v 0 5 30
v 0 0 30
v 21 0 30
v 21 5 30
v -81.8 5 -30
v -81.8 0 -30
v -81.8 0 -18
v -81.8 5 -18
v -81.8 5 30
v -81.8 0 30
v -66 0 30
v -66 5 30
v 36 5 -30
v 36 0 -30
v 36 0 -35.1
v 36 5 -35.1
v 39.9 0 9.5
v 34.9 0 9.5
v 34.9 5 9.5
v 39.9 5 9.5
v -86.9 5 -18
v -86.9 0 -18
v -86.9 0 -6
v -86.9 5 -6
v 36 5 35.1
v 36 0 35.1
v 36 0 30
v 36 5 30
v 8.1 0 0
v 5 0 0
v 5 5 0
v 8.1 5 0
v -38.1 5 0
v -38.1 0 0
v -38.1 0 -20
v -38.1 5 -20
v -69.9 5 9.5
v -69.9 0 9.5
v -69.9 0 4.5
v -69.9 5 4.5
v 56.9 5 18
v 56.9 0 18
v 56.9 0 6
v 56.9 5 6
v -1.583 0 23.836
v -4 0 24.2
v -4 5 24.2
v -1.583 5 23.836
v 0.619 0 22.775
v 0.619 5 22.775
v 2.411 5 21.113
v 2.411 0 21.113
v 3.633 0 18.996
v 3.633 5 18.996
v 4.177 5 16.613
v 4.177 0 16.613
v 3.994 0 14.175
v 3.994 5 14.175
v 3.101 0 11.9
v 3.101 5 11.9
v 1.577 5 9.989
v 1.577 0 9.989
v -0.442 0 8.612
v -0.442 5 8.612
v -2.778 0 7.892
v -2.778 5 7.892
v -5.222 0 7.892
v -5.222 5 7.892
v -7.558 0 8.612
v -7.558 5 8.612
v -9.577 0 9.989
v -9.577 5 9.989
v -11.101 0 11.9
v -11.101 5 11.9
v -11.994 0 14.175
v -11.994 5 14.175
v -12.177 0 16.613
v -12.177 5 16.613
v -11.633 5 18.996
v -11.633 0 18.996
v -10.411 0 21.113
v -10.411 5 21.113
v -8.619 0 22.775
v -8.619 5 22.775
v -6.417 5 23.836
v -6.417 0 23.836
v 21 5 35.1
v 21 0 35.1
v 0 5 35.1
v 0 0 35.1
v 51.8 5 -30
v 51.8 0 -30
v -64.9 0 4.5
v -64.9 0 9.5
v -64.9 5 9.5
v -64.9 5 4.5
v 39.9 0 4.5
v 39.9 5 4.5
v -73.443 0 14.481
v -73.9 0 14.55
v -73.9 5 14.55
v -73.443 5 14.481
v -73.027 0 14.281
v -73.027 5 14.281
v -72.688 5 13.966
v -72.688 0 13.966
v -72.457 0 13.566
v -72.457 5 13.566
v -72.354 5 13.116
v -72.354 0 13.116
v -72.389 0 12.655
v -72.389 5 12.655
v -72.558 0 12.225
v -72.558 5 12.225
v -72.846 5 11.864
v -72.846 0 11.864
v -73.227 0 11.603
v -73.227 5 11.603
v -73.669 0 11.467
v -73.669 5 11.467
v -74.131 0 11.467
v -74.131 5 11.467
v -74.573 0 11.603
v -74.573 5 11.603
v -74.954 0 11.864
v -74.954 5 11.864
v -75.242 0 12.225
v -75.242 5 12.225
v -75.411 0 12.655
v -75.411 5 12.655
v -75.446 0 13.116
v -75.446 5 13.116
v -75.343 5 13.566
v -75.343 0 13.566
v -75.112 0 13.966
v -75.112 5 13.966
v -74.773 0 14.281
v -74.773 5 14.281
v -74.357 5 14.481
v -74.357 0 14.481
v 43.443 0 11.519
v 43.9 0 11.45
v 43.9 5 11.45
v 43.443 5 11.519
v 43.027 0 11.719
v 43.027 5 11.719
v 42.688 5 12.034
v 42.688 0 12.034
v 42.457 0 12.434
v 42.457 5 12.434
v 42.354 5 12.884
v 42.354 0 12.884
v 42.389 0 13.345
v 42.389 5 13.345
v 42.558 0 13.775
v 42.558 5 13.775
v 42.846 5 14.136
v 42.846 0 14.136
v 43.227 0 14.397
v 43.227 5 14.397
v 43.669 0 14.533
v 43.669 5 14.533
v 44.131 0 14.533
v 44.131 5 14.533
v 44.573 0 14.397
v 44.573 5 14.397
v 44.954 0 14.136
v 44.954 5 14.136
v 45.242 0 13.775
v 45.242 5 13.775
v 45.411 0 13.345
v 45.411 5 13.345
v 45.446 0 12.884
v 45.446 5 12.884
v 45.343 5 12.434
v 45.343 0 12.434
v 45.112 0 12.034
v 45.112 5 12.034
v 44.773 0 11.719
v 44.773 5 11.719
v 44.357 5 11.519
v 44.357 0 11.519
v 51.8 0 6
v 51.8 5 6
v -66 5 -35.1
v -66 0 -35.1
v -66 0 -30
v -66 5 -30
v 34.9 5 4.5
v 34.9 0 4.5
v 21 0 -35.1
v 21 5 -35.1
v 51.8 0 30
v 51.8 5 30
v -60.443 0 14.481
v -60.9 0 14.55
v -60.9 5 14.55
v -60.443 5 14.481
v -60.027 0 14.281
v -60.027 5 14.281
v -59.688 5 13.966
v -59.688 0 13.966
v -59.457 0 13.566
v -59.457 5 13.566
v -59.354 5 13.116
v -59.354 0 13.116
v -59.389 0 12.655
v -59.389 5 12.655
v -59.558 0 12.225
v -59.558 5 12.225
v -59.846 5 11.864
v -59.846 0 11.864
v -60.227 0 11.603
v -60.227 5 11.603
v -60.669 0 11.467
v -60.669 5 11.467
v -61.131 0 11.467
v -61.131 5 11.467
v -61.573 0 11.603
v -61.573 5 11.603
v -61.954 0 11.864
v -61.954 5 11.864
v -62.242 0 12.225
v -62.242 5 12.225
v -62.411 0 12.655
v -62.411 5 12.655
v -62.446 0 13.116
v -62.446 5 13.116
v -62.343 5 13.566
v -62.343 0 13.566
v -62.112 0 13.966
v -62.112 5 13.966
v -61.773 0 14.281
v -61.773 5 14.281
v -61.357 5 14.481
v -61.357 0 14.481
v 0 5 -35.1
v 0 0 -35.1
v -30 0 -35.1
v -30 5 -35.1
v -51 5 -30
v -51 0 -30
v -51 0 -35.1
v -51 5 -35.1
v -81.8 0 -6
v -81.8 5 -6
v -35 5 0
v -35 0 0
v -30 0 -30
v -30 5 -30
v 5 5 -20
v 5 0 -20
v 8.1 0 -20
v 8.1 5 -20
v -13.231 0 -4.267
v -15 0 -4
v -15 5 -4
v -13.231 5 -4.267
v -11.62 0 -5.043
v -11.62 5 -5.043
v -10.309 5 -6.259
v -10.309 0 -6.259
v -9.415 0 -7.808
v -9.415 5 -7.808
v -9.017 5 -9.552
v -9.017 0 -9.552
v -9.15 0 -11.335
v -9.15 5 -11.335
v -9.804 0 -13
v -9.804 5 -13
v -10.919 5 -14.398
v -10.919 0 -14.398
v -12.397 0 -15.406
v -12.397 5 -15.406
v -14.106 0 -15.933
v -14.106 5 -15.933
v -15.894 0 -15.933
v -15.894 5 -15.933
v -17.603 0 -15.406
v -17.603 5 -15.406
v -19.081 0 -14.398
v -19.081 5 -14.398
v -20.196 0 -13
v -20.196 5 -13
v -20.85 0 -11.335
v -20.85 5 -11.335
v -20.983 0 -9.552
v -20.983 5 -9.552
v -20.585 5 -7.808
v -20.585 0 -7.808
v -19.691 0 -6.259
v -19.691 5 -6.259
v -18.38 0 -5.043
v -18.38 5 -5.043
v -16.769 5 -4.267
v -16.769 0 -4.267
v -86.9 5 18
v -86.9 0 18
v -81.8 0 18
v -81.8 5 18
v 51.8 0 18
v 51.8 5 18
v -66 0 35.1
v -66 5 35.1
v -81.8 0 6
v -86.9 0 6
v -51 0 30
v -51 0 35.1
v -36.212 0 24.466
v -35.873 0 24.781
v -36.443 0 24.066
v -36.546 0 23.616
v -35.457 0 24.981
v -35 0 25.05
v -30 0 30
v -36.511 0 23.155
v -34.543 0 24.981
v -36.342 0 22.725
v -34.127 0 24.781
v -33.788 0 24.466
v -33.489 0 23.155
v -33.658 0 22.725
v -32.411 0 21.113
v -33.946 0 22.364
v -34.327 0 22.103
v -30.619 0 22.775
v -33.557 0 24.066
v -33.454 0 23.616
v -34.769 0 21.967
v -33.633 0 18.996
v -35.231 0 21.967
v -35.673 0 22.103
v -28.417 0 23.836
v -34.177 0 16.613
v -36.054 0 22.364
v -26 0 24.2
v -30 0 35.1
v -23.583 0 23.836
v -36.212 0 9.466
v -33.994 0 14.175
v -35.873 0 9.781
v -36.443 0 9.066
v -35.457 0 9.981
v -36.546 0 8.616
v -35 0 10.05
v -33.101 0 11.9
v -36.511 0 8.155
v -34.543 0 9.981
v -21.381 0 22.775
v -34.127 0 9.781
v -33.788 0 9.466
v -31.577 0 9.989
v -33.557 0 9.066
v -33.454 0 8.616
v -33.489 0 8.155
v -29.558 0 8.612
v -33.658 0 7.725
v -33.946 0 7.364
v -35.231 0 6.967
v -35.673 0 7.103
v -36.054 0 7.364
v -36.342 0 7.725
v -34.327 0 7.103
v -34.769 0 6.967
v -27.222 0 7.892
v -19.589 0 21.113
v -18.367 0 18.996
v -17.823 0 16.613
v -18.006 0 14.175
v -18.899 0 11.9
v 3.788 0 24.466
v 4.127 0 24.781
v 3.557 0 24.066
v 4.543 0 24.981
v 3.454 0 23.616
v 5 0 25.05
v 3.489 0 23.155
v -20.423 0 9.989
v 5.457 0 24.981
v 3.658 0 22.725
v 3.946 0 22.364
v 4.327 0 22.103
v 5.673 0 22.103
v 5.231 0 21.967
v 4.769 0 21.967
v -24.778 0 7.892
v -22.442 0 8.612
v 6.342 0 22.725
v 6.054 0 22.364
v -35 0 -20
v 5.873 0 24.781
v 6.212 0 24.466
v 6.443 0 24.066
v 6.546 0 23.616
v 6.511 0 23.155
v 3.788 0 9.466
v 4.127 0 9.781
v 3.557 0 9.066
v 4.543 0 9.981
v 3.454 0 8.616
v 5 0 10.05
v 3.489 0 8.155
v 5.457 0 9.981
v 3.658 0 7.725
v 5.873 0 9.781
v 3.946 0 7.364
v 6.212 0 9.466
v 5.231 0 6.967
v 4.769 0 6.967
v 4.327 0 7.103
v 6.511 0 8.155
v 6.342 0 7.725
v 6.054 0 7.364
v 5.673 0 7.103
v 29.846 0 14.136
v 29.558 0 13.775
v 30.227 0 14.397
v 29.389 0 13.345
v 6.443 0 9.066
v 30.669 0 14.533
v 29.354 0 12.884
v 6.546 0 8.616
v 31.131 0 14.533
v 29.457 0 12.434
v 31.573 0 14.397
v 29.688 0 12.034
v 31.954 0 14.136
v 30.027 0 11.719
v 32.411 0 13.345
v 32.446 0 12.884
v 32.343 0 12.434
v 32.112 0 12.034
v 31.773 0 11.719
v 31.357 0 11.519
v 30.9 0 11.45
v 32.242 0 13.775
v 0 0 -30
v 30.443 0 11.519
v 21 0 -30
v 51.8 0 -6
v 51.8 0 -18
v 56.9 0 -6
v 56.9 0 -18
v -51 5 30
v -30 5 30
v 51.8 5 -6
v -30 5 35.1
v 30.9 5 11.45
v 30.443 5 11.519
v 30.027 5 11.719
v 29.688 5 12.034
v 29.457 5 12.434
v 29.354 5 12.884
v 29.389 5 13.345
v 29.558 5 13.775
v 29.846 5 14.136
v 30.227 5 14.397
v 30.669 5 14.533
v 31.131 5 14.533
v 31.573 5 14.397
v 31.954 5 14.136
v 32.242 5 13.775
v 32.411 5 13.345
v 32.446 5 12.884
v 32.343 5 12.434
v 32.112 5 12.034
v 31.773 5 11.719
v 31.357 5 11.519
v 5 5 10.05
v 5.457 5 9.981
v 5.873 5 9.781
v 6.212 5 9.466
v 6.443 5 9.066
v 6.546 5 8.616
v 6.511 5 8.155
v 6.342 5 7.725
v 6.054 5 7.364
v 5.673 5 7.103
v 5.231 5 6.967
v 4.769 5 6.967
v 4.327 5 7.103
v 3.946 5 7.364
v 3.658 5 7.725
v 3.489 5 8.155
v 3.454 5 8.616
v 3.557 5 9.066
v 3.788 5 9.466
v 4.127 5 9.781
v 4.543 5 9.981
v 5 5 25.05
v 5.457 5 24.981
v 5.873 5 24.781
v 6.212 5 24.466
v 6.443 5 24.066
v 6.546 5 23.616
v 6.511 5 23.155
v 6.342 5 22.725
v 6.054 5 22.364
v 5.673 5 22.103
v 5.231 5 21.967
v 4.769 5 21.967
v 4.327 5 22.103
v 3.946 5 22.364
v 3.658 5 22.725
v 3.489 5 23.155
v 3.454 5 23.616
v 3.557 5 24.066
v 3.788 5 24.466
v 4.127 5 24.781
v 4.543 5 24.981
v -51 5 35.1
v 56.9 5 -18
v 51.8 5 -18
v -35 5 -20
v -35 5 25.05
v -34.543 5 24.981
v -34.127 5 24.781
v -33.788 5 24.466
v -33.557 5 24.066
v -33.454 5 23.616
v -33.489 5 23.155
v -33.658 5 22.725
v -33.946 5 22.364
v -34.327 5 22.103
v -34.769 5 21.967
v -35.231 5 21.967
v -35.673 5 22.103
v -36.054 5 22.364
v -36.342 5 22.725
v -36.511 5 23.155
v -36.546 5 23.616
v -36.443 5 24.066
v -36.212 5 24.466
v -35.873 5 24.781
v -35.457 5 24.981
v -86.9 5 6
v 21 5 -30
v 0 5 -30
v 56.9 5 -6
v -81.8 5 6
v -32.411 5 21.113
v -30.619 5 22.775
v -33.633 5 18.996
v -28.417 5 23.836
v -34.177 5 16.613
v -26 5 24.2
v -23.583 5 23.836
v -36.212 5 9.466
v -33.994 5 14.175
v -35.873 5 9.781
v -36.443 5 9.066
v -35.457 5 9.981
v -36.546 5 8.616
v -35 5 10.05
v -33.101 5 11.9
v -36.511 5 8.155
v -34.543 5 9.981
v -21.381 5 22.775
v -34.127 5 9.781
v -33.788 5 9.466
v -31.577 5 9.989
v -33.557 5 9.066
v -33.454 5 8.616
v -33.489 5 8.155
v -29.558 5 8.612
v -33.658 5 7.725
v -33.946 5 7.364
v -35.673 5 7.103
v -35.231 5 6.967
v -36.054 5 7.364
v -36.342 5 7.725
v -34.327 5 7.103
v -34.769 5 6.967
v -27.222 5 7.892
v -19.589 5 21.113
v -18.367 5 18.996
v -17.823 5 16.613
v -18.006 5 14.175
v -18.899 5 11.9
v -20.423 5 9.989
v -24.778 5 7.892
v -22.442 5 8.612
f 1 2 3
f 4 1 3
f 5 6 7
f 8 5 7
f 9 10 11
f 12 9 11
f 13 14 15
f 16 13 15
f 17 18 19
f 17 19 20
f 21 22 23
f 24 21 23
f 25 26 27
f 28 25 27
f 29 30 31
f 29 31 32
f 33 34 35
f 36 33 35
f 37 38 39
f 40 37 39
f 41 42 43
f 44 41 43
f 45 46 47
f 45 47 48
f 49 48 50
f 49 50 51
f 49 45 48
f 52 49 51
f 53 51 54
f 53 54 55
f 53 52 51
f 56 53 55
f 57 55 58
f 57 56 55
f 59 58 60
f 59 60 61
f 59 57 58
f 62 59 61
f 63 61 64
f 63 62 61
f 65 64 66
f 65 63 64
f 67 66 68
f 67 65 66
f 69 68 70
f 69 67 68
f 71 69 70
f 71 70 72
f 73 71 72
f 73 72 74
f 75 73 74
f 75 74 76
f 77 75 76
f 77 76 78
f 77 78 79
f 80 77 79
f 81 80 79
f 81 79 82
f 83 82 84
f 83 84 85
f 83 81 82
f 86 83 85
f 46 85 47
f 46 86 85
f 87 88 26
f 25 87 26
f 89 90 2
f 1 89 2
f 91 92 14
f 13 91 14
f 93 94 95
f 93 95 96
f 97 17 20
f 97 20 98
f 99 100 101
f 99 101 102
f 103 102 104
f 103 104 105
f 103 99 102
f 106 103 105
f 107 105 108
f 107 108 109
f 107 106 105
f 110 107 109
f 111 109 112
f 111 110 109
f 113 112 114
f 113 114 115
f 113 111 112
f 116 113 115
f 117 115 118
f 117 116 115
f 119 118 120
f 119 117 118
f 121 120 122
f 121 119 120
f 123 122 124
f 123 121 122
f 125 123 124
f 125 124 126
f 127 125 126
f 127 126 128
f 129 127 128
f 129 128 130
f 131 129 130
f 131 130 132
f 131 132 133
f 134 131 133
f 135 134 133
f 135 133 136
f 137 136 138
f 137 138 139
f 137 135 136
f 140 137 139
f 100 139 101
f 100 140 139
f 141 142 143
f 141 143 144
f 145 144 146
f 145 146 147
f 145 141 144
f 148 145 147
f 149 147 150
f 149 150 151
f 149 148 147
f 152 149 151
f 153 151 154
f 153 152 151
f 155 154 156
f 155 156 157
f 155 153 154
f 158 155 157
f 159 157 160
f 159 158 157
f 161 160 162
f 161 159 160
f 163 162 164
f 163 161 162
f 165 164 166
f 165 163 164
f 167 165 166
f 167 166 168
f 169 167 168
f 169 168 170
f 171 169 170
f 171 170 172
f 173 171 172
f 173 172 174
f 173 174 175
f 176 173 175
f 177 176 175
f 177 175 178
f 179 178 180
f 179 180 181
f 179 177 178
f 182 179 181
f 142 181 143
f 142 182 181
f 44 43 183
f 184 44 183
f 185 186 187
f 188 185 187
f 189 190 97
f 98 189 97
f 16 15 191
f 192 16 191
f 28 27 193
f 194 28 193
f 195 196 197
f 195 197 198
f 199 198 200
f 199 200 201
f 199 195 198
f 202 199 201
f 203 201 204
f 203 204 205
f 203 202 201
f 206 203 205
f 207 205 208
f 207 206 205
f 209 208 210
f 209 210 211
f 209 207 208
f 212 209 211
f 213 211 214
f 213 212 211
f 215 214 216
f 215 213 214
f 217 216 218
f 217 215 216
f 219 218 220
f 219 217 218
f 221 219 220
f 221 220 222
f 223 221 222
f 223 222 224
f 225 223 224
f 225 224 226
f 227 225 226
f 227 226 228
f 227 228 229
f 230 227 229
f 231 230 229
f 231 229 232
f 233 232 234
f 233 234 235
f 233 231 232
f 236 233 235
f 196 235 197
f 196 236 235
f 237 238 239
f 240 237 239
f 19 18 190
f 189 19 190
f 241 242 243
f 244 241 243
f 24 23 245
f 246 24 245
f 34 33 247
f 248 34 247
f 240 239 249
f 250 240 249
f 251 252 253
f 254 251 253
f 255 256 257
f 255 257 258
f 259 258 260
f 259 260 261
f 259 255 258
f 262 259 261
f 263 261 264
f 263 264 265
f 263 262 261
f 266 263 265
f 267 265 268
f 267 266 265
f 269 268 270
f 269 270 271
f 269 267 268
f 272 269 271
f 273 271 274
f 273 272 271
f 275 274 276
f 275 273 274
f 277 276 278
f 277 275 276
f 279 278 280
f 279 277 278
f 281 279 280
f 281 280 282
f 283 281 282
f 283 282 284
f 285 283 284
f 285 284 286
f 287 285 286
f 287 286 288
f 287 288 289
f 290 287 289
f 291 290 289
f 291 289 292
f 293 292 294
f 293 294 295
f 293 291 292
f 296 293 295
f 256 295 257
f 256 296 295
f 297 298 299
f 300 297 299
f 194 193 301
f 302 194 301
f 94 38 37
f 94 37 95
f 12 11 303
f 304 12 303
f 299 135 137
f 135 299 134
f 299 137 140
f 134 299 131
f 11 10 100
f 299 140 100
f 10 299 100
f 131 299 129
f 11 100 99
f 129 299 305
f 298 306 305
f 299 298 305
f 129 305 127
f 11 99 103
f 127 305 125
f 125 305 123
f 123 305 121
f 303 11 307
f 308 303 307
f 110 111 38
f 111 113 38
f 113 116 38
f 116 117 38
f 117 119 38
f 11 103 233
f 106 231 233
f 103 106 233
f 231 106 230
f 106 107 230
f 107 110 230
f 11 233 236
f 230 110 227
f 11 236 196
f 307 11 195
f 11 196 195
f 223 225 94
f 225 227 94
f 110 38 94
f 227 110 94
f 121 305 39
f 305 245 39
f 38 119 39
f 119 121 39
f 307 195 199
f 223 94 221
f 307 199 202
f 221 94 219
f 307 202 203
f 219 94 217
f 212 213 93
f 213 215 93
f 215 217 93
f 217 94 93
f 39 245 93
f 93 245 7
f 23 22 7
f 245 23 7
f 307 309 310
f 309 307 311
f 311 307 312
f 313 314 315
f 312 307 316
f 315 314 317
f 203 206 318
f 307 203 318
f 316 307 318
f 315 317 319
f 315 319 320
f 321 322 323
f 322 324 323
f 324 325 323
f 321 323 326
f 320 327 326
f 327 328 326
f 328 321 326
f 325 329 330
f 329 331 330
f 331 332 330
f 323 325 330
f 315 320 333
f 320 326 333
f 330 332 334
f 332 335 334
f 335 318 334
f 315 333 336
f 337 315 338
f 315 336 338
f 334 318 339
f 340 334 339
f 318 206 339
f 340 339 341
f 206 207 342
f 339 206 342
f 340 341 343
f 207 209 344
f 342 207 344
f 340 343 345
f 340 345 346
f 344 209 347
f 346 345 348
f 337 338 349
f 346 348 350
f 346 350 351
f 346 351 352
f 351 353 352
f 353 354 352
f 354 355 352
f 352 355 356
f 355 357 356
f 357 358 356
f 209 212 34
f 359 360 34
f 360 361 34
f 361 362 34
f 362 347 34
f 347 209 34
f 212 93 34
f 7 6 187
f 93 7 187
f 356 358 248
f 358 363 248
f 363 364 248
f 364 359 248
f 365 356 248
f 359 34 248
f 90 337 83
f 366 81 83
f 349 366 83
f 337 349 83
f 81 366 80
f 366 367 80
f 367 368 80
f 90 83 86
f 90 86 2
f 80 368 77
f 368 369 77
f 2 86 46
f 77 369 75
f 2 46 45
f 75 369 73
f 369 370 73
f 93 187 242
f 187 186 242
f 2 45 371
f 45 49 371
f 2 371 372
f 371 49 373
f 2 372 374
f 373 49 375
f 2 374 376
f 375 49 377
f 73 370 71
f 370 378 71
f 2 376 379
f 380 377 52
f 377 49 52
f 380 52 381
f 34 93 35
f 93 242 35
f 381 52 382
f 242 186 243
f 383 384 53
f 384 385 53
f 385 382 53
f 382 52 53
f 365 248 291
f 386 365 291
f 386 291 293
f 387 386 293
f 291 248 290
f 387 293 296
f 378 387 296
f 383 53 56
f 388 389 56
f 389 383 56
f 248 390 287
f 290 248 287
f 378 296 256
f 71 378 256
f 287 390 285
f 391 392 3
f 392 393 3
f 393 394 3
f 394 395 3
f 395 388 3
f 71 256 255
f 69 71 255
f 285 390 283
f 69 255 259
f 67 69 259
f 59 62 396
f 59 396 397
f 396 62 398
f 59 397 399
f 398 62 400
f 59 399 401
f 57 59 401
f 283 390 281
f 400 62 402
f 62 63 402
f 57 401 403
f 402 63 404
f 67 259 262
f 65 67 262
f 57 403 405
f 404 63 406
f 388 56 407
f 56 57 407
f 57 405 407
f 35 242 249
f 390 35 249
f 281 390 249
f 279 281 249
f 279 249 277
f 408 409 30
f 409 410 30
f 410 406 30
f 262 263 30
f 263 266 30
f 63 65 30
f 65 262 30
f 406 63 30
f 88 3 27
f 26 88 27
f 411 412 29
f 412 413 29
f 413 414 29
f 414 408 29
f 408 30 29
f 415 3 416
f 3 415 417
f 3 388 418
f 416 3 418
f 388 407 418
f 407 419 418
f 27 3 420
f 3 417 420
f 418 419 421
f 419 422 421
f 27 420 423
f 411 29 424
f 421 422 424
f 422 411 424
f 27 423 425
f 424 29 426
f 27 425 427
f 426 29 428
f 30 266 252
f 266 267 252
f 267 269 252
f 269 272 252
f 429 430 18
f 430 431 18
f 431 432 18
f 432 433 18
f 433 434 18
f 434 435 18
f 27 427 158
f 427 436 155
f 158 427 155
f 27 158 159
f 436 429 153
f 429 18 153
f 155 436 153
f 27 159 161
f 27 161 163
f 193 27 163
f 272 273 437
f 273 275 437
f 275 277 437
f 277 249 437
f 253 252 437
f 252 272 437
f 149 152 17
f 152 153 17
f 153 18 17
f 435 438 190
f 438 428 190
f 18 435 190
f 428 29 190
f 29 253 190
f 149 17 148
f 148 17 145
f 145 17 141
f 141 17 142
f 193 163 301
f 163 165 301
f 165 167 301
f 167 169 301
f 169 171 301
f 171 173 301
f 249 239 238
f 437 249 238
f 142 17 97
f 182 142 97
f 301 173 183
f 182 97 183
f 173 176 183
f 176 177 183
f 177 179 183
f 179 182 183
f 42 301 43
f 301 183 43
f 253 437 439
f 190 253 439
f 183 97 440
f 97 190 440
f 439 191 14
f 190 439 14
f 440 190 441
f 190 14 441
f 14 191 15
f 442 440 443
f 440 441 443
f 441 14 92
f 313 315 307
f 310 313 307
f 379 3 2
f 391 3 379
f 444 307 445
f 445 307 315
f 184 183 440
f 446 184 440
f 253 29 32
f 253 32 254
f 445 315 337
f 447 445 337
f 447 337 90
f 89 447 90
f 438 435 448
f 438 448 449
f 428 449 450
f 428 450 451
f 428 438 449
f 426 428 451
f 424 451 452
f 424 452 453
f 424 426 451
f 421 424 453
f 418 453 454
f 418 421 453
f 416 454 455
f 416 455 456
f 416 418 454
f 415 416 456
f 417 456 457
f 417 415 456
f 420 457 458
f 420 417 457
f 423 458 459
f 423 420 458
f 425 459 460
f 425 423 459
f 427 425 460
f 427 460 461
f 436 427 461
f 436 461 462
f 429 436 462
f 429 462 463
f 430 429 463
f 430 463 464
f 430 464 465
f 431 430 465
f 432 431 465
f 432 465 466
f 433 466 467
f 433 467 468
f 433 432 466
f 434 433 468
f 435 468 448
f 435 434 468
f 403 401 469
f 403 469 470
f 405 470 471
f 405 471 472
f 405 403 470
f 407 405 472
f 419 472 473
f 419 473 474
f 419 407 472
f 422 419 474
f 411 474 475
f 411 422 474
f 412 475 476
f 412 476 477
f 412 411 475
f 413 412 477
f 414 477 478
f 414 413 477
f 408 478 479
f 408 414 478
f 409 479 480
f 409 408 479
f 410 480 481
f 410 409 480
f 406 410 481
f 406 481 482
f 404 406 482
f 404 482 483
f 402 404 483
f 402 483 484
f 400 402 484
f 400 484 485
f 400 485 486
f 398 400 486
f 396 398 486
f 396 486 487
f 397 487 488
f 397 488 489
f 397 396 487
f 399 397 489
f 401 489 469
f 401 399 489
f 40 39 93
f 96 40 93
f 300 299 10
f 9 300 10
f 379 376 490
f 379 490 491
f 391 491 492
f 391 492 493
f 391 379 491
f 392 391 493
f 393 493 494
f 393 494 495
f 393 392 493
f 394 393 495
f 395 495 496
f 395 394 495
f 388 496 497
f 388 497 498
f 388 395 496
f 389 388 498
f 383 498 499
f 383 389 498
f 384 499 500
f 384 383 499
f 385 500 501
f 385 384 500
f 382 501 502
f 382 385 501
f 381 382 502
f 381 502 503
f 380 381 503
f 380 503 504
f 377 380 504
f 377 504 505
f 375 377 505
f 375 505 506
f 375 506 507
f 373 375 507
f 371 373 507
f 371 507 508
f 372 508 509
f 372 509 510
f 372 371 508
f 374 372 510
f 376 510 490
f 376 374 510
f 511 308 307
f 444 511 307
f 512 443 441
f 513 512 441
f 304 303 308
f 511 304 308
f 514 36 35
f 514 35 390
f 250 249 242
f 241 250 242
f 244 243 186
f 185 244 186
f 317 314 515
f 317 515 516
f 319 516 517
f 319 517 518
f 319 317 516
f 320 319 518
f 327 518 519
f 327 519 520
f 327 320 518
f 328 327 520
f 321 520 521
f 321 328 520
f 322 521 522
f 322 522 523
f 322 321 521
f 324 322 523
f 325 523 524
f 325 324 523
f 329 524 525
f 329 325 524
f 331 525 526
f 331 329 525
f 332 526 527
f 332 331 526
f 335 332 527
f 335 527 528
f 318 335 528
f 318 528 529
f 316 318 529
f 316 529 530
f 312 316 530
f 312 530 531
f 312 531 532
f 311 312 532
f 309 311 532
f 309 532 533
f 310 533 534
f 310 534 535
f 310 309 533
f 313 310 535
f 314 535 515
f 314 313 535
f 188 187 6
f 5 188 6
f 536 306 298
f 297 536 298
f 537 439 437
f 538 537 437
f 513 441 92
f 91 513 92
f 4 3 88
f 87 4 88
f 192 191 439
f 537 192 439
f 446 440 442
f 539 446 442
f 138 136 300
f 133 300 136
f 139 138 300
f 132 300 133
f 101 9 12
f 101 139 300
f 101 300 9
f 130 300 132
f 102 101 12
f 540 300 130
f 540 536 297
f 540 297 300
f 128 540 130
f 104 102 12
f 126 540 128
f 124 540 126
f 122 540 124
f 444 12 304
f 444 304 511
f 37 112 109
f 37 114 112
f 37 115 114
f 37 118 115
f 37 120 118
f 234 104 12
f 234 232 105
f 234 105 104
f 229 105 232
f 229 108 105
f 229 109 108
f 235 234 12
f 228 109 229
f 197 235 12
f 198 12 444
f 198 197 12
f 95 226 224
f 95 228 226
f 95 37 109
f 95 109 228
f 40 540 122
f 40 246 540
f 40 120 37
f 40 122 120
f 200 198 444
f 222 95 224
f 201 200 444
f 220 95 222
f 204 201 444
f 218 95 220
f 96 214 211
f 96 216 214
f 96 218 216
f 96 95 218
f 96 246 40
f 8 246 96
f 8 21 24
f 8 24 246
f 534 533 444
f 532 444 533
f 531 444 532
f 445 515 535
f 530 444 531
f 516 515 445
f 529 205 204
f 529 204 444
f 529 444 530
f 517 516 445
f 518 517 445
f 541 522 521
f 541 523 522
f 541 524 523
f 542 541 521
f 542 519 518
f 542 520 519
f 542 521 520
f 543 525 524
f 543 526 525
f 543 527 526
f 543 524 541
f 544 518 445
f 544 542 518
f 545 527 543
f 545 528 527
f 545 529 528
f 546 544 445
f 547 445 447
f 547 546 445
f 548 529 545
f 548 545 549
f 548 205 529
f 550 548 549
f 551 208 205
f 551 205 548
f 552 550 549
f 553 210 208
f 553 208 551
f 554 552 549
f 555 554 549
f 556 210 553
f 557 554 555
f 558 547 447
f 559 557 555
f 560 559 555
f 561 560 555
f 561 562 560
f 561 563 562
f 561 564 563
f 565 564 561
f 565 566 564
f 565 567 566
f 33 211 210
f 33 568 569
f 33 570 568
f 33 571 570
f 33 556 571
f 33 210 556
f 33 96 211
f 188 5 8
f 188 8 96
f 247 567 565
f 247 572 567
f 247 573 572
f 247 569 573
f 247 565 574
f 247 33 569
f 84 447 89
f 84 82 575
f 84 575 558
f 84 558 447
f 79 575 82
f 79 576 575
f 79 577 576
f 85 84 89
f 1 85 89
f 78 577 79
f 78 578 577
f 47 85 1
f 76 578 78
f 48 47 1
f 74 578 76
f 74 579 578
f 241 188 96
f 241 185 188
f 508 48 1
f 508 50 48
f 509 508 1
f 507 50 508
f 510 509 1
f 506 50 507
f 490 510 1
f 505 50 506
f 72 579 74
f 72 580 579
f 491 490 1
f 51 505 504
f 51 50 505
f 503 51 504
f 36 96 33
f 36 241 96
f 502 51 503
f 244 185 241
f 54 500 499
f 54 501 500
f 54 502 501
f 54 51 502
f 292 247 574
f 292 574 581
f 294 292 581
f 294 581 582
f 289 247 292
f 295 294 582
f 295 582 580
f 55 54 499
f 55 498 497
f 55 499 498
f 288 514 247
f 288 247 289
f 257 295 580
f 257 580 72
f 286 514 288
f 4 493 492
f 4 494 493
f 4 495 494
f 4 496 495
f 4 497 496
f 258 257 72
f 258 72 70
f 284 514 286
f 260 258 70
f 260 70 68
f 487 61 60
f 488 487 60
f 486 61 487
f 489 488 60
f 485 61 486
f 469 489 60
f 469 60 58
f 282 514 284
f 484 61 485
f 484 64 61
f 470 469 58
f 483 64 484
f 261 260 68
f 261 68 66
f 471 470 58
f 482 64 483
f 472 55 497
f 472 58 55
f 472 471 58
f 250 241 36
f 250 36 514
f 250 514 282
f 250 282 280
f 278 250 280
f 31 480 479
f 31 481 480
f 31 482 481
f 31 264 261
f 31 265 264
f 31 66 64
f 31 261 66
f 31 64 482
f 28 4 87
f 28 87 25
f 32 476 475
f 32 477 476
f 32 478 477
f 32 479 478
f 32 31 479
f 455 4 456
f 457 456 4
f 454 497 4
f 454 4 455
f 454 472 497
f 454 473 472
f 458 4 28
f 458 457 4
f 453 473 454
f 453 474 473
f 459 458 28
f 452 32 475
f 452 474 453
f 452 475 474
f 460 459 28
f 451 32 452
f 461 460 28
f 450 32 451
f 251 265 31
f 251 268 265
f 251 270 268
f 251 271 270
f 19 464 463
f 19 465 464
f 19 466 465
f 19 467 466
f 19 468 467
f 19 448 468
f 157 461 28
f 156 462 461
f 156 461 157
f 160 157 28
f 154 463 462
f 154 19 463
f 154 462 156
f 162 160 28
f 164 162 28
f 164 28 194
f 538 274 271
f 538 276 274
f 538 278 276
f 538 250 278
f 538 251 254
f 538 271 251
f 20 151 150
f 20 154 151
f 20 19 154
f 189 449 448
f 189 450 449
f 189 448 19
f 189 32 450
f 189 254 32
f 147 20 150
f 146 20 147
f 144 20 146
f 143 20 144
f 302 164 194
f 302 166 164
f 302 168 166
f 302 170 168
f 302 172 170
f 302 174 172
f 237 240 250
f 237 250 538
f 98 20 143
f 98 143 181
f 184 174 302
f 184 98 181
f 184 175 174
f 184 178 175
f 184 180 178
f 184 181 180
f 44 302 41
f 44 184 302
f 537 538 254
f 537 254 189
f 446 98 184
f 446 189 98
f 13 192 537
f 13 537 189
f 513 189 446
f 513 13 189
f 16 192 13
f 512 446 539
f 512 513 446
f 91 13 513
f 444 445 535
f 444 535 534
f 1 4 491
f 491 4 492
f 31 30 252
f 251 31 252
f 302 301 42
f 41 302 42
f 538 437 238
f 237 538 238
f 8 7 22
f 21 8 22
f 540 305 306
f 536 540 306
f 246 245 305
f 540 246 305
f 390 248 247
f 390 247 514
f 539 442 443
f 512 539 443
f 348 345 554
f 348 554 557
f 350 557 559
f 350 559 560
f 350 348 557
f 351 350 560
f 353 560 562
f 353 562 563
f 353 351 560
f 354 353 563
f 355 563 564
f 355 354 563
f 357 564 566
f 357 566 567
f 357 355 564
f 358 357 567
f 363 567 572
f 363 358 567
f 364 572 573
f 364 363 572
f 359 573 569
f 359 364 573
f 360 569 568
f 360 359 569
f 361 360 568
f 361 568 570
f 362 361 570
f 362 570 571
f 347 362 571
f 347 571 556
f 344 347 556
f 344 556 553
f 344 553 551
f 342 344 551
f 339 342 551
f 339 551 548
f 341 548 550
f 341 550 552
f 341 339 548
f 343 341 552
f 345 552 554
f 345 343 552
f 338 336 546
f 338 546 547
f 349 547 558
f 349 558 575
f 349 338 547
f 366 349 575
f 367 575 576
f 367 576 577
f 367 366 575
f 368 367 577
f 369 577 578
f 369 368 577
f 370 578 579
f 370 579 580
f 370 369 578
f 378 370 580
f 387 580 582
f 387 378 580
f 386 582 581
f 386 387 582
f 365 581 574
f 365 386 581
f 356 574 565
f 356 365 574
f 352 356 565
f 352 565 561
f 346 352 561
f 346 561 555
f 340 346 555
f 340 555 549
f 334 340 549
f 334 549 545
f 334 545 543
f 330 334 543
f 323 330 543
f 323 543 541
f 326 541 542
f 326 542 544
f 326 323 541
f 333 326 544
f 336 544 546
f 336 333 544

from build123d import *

# Parameters (mm, degrees)
SKETCH1_R           = 8.2
SKETCH1_R_2         = 6
SKETCH1_R_3         = 1.55
SKETCH1_W           = 3.1
SKETCH1_H           = 20
SKETCH1_W_2         = 5
SKETCH1_H_2         = 5
BOSS_EXTRUDE1_DEPTH = 5


with BuildPart() as part:
    # Sketch1 → Boss-Extrude1 (new body)
    with BuildSketch(Plane(origin=(0, 0, 0), x_dir=(1, 0, 0), z_dir=(0, 1, 0))):
        Polygon((-81.8, -30), (-66, -30), (-66, -35.1), (-51, -35.1), (-51, -30), (-30, -30), (-30, -35.1), (0, -35.1), (0, -30), (21, -30), (21, -35.1), (36, -35.1), (36, -30), (51.8, -30), (51.8, -18), (56.9, -18), (56.9, -6), (51.8, -6), (51.8, 6), (56.9, 6), (56.9, 18), (51.8, 18), (51.8, 30), (36, 30), (36, 35.1), (21, 35.1), (21, 30), (0, 30), (0, 35.1), (-30, 35.1), (-30, 30), (-51, 30), (-51, 35.1), (-66, 35.1), (-66, 30), (-81.8, 30), (-81.8, 18), (-86.9, 18), (-86.9, 6), (-81.8, 6), (-81.8, -6), (-86.9, -6), (-86.9, -18), (-81.8, -18), align=None)
        with Locations(Location((-4, -16, 0), (0, 0, 270))):
            Circle(SKETCH1_R, mode=Mode.SUBTRACT)
        with Locations(Location((-26, -16, 0), (0, 0, 270))):
            Circle(SKETCH1_R, mode=Mode.SUBTRACT)
        with Locations(Location((-15, 10, 0), (0, 0, 270))):
            Circle(SKETCH1_R_2, mode=Mode.SUBTRACT)
        with Locations(Location((5, -8.5, 0), (0, 0, 270))):
            Circle(SKETCH1_R_3, mode=Mode.SUBTRACT)
        with Locations(Location((5, -23.5, 0), (0, 0, 270))):
            Circle(SKETCH1_R_3, mode=Mode.SUBTRACT)
        with Locations(Location((-35, -8.5, 0), (0, 0, 270))):
            Circle(SKETCH1_R_3, mode=Mode.SUBTRACT)
        with Locations(Location((-35, -23.5, 0), (0, 0, 270))):
            Circle(SKETCH1_R_3, mode=Mode.SUBTRACT)
        with Locations(Location((-73.9, -13, 0), (0, 0, 270))):
            Circle(SKETCH1_R_3, mode=Mode.SUBTRACT)
        with Locations(Location((-60.9, -13, 0), (0, 0, 270))):
            Circle(SKETCH1_R_3, mode=Mode.SUBTRACT)
        with Locations(Location((30.9, -13, 0), (0, 0, 90))):
            Circle(SKETCH1_R_3, mode=Mode.SUBTRACT)
        with Locations(Location((43.9, -13, 0), (0, 0, 90))):
            Circle(SKETCH1_R_3, mode=Mode.SUBTRACT)
        with Locations((6.55, 10)):
            Rectangle(SKETCH1_W, SKETCH1_H, mode=Mode.SUBTRACT)
        with Locations((-36.55, 10)):
            Rectangle(SKETCH1_W, SKETCH1_H, mode=Mode.SUBTRACT)
        with Locations((-67.4, -7)):
            Rectangle(SKETCH1_W_2, SKETCH1_H_2, mode=Mode.SUBTRACT)
        with Locations((37.4, -7)):
            Rectangle(SKETCH1_W_2, SKETCH1_H_2, mode=Mode.SUBTRACT)
    extrude(amount=BOSS_EXTRUDE1_DEPTH)


solid = part.part
